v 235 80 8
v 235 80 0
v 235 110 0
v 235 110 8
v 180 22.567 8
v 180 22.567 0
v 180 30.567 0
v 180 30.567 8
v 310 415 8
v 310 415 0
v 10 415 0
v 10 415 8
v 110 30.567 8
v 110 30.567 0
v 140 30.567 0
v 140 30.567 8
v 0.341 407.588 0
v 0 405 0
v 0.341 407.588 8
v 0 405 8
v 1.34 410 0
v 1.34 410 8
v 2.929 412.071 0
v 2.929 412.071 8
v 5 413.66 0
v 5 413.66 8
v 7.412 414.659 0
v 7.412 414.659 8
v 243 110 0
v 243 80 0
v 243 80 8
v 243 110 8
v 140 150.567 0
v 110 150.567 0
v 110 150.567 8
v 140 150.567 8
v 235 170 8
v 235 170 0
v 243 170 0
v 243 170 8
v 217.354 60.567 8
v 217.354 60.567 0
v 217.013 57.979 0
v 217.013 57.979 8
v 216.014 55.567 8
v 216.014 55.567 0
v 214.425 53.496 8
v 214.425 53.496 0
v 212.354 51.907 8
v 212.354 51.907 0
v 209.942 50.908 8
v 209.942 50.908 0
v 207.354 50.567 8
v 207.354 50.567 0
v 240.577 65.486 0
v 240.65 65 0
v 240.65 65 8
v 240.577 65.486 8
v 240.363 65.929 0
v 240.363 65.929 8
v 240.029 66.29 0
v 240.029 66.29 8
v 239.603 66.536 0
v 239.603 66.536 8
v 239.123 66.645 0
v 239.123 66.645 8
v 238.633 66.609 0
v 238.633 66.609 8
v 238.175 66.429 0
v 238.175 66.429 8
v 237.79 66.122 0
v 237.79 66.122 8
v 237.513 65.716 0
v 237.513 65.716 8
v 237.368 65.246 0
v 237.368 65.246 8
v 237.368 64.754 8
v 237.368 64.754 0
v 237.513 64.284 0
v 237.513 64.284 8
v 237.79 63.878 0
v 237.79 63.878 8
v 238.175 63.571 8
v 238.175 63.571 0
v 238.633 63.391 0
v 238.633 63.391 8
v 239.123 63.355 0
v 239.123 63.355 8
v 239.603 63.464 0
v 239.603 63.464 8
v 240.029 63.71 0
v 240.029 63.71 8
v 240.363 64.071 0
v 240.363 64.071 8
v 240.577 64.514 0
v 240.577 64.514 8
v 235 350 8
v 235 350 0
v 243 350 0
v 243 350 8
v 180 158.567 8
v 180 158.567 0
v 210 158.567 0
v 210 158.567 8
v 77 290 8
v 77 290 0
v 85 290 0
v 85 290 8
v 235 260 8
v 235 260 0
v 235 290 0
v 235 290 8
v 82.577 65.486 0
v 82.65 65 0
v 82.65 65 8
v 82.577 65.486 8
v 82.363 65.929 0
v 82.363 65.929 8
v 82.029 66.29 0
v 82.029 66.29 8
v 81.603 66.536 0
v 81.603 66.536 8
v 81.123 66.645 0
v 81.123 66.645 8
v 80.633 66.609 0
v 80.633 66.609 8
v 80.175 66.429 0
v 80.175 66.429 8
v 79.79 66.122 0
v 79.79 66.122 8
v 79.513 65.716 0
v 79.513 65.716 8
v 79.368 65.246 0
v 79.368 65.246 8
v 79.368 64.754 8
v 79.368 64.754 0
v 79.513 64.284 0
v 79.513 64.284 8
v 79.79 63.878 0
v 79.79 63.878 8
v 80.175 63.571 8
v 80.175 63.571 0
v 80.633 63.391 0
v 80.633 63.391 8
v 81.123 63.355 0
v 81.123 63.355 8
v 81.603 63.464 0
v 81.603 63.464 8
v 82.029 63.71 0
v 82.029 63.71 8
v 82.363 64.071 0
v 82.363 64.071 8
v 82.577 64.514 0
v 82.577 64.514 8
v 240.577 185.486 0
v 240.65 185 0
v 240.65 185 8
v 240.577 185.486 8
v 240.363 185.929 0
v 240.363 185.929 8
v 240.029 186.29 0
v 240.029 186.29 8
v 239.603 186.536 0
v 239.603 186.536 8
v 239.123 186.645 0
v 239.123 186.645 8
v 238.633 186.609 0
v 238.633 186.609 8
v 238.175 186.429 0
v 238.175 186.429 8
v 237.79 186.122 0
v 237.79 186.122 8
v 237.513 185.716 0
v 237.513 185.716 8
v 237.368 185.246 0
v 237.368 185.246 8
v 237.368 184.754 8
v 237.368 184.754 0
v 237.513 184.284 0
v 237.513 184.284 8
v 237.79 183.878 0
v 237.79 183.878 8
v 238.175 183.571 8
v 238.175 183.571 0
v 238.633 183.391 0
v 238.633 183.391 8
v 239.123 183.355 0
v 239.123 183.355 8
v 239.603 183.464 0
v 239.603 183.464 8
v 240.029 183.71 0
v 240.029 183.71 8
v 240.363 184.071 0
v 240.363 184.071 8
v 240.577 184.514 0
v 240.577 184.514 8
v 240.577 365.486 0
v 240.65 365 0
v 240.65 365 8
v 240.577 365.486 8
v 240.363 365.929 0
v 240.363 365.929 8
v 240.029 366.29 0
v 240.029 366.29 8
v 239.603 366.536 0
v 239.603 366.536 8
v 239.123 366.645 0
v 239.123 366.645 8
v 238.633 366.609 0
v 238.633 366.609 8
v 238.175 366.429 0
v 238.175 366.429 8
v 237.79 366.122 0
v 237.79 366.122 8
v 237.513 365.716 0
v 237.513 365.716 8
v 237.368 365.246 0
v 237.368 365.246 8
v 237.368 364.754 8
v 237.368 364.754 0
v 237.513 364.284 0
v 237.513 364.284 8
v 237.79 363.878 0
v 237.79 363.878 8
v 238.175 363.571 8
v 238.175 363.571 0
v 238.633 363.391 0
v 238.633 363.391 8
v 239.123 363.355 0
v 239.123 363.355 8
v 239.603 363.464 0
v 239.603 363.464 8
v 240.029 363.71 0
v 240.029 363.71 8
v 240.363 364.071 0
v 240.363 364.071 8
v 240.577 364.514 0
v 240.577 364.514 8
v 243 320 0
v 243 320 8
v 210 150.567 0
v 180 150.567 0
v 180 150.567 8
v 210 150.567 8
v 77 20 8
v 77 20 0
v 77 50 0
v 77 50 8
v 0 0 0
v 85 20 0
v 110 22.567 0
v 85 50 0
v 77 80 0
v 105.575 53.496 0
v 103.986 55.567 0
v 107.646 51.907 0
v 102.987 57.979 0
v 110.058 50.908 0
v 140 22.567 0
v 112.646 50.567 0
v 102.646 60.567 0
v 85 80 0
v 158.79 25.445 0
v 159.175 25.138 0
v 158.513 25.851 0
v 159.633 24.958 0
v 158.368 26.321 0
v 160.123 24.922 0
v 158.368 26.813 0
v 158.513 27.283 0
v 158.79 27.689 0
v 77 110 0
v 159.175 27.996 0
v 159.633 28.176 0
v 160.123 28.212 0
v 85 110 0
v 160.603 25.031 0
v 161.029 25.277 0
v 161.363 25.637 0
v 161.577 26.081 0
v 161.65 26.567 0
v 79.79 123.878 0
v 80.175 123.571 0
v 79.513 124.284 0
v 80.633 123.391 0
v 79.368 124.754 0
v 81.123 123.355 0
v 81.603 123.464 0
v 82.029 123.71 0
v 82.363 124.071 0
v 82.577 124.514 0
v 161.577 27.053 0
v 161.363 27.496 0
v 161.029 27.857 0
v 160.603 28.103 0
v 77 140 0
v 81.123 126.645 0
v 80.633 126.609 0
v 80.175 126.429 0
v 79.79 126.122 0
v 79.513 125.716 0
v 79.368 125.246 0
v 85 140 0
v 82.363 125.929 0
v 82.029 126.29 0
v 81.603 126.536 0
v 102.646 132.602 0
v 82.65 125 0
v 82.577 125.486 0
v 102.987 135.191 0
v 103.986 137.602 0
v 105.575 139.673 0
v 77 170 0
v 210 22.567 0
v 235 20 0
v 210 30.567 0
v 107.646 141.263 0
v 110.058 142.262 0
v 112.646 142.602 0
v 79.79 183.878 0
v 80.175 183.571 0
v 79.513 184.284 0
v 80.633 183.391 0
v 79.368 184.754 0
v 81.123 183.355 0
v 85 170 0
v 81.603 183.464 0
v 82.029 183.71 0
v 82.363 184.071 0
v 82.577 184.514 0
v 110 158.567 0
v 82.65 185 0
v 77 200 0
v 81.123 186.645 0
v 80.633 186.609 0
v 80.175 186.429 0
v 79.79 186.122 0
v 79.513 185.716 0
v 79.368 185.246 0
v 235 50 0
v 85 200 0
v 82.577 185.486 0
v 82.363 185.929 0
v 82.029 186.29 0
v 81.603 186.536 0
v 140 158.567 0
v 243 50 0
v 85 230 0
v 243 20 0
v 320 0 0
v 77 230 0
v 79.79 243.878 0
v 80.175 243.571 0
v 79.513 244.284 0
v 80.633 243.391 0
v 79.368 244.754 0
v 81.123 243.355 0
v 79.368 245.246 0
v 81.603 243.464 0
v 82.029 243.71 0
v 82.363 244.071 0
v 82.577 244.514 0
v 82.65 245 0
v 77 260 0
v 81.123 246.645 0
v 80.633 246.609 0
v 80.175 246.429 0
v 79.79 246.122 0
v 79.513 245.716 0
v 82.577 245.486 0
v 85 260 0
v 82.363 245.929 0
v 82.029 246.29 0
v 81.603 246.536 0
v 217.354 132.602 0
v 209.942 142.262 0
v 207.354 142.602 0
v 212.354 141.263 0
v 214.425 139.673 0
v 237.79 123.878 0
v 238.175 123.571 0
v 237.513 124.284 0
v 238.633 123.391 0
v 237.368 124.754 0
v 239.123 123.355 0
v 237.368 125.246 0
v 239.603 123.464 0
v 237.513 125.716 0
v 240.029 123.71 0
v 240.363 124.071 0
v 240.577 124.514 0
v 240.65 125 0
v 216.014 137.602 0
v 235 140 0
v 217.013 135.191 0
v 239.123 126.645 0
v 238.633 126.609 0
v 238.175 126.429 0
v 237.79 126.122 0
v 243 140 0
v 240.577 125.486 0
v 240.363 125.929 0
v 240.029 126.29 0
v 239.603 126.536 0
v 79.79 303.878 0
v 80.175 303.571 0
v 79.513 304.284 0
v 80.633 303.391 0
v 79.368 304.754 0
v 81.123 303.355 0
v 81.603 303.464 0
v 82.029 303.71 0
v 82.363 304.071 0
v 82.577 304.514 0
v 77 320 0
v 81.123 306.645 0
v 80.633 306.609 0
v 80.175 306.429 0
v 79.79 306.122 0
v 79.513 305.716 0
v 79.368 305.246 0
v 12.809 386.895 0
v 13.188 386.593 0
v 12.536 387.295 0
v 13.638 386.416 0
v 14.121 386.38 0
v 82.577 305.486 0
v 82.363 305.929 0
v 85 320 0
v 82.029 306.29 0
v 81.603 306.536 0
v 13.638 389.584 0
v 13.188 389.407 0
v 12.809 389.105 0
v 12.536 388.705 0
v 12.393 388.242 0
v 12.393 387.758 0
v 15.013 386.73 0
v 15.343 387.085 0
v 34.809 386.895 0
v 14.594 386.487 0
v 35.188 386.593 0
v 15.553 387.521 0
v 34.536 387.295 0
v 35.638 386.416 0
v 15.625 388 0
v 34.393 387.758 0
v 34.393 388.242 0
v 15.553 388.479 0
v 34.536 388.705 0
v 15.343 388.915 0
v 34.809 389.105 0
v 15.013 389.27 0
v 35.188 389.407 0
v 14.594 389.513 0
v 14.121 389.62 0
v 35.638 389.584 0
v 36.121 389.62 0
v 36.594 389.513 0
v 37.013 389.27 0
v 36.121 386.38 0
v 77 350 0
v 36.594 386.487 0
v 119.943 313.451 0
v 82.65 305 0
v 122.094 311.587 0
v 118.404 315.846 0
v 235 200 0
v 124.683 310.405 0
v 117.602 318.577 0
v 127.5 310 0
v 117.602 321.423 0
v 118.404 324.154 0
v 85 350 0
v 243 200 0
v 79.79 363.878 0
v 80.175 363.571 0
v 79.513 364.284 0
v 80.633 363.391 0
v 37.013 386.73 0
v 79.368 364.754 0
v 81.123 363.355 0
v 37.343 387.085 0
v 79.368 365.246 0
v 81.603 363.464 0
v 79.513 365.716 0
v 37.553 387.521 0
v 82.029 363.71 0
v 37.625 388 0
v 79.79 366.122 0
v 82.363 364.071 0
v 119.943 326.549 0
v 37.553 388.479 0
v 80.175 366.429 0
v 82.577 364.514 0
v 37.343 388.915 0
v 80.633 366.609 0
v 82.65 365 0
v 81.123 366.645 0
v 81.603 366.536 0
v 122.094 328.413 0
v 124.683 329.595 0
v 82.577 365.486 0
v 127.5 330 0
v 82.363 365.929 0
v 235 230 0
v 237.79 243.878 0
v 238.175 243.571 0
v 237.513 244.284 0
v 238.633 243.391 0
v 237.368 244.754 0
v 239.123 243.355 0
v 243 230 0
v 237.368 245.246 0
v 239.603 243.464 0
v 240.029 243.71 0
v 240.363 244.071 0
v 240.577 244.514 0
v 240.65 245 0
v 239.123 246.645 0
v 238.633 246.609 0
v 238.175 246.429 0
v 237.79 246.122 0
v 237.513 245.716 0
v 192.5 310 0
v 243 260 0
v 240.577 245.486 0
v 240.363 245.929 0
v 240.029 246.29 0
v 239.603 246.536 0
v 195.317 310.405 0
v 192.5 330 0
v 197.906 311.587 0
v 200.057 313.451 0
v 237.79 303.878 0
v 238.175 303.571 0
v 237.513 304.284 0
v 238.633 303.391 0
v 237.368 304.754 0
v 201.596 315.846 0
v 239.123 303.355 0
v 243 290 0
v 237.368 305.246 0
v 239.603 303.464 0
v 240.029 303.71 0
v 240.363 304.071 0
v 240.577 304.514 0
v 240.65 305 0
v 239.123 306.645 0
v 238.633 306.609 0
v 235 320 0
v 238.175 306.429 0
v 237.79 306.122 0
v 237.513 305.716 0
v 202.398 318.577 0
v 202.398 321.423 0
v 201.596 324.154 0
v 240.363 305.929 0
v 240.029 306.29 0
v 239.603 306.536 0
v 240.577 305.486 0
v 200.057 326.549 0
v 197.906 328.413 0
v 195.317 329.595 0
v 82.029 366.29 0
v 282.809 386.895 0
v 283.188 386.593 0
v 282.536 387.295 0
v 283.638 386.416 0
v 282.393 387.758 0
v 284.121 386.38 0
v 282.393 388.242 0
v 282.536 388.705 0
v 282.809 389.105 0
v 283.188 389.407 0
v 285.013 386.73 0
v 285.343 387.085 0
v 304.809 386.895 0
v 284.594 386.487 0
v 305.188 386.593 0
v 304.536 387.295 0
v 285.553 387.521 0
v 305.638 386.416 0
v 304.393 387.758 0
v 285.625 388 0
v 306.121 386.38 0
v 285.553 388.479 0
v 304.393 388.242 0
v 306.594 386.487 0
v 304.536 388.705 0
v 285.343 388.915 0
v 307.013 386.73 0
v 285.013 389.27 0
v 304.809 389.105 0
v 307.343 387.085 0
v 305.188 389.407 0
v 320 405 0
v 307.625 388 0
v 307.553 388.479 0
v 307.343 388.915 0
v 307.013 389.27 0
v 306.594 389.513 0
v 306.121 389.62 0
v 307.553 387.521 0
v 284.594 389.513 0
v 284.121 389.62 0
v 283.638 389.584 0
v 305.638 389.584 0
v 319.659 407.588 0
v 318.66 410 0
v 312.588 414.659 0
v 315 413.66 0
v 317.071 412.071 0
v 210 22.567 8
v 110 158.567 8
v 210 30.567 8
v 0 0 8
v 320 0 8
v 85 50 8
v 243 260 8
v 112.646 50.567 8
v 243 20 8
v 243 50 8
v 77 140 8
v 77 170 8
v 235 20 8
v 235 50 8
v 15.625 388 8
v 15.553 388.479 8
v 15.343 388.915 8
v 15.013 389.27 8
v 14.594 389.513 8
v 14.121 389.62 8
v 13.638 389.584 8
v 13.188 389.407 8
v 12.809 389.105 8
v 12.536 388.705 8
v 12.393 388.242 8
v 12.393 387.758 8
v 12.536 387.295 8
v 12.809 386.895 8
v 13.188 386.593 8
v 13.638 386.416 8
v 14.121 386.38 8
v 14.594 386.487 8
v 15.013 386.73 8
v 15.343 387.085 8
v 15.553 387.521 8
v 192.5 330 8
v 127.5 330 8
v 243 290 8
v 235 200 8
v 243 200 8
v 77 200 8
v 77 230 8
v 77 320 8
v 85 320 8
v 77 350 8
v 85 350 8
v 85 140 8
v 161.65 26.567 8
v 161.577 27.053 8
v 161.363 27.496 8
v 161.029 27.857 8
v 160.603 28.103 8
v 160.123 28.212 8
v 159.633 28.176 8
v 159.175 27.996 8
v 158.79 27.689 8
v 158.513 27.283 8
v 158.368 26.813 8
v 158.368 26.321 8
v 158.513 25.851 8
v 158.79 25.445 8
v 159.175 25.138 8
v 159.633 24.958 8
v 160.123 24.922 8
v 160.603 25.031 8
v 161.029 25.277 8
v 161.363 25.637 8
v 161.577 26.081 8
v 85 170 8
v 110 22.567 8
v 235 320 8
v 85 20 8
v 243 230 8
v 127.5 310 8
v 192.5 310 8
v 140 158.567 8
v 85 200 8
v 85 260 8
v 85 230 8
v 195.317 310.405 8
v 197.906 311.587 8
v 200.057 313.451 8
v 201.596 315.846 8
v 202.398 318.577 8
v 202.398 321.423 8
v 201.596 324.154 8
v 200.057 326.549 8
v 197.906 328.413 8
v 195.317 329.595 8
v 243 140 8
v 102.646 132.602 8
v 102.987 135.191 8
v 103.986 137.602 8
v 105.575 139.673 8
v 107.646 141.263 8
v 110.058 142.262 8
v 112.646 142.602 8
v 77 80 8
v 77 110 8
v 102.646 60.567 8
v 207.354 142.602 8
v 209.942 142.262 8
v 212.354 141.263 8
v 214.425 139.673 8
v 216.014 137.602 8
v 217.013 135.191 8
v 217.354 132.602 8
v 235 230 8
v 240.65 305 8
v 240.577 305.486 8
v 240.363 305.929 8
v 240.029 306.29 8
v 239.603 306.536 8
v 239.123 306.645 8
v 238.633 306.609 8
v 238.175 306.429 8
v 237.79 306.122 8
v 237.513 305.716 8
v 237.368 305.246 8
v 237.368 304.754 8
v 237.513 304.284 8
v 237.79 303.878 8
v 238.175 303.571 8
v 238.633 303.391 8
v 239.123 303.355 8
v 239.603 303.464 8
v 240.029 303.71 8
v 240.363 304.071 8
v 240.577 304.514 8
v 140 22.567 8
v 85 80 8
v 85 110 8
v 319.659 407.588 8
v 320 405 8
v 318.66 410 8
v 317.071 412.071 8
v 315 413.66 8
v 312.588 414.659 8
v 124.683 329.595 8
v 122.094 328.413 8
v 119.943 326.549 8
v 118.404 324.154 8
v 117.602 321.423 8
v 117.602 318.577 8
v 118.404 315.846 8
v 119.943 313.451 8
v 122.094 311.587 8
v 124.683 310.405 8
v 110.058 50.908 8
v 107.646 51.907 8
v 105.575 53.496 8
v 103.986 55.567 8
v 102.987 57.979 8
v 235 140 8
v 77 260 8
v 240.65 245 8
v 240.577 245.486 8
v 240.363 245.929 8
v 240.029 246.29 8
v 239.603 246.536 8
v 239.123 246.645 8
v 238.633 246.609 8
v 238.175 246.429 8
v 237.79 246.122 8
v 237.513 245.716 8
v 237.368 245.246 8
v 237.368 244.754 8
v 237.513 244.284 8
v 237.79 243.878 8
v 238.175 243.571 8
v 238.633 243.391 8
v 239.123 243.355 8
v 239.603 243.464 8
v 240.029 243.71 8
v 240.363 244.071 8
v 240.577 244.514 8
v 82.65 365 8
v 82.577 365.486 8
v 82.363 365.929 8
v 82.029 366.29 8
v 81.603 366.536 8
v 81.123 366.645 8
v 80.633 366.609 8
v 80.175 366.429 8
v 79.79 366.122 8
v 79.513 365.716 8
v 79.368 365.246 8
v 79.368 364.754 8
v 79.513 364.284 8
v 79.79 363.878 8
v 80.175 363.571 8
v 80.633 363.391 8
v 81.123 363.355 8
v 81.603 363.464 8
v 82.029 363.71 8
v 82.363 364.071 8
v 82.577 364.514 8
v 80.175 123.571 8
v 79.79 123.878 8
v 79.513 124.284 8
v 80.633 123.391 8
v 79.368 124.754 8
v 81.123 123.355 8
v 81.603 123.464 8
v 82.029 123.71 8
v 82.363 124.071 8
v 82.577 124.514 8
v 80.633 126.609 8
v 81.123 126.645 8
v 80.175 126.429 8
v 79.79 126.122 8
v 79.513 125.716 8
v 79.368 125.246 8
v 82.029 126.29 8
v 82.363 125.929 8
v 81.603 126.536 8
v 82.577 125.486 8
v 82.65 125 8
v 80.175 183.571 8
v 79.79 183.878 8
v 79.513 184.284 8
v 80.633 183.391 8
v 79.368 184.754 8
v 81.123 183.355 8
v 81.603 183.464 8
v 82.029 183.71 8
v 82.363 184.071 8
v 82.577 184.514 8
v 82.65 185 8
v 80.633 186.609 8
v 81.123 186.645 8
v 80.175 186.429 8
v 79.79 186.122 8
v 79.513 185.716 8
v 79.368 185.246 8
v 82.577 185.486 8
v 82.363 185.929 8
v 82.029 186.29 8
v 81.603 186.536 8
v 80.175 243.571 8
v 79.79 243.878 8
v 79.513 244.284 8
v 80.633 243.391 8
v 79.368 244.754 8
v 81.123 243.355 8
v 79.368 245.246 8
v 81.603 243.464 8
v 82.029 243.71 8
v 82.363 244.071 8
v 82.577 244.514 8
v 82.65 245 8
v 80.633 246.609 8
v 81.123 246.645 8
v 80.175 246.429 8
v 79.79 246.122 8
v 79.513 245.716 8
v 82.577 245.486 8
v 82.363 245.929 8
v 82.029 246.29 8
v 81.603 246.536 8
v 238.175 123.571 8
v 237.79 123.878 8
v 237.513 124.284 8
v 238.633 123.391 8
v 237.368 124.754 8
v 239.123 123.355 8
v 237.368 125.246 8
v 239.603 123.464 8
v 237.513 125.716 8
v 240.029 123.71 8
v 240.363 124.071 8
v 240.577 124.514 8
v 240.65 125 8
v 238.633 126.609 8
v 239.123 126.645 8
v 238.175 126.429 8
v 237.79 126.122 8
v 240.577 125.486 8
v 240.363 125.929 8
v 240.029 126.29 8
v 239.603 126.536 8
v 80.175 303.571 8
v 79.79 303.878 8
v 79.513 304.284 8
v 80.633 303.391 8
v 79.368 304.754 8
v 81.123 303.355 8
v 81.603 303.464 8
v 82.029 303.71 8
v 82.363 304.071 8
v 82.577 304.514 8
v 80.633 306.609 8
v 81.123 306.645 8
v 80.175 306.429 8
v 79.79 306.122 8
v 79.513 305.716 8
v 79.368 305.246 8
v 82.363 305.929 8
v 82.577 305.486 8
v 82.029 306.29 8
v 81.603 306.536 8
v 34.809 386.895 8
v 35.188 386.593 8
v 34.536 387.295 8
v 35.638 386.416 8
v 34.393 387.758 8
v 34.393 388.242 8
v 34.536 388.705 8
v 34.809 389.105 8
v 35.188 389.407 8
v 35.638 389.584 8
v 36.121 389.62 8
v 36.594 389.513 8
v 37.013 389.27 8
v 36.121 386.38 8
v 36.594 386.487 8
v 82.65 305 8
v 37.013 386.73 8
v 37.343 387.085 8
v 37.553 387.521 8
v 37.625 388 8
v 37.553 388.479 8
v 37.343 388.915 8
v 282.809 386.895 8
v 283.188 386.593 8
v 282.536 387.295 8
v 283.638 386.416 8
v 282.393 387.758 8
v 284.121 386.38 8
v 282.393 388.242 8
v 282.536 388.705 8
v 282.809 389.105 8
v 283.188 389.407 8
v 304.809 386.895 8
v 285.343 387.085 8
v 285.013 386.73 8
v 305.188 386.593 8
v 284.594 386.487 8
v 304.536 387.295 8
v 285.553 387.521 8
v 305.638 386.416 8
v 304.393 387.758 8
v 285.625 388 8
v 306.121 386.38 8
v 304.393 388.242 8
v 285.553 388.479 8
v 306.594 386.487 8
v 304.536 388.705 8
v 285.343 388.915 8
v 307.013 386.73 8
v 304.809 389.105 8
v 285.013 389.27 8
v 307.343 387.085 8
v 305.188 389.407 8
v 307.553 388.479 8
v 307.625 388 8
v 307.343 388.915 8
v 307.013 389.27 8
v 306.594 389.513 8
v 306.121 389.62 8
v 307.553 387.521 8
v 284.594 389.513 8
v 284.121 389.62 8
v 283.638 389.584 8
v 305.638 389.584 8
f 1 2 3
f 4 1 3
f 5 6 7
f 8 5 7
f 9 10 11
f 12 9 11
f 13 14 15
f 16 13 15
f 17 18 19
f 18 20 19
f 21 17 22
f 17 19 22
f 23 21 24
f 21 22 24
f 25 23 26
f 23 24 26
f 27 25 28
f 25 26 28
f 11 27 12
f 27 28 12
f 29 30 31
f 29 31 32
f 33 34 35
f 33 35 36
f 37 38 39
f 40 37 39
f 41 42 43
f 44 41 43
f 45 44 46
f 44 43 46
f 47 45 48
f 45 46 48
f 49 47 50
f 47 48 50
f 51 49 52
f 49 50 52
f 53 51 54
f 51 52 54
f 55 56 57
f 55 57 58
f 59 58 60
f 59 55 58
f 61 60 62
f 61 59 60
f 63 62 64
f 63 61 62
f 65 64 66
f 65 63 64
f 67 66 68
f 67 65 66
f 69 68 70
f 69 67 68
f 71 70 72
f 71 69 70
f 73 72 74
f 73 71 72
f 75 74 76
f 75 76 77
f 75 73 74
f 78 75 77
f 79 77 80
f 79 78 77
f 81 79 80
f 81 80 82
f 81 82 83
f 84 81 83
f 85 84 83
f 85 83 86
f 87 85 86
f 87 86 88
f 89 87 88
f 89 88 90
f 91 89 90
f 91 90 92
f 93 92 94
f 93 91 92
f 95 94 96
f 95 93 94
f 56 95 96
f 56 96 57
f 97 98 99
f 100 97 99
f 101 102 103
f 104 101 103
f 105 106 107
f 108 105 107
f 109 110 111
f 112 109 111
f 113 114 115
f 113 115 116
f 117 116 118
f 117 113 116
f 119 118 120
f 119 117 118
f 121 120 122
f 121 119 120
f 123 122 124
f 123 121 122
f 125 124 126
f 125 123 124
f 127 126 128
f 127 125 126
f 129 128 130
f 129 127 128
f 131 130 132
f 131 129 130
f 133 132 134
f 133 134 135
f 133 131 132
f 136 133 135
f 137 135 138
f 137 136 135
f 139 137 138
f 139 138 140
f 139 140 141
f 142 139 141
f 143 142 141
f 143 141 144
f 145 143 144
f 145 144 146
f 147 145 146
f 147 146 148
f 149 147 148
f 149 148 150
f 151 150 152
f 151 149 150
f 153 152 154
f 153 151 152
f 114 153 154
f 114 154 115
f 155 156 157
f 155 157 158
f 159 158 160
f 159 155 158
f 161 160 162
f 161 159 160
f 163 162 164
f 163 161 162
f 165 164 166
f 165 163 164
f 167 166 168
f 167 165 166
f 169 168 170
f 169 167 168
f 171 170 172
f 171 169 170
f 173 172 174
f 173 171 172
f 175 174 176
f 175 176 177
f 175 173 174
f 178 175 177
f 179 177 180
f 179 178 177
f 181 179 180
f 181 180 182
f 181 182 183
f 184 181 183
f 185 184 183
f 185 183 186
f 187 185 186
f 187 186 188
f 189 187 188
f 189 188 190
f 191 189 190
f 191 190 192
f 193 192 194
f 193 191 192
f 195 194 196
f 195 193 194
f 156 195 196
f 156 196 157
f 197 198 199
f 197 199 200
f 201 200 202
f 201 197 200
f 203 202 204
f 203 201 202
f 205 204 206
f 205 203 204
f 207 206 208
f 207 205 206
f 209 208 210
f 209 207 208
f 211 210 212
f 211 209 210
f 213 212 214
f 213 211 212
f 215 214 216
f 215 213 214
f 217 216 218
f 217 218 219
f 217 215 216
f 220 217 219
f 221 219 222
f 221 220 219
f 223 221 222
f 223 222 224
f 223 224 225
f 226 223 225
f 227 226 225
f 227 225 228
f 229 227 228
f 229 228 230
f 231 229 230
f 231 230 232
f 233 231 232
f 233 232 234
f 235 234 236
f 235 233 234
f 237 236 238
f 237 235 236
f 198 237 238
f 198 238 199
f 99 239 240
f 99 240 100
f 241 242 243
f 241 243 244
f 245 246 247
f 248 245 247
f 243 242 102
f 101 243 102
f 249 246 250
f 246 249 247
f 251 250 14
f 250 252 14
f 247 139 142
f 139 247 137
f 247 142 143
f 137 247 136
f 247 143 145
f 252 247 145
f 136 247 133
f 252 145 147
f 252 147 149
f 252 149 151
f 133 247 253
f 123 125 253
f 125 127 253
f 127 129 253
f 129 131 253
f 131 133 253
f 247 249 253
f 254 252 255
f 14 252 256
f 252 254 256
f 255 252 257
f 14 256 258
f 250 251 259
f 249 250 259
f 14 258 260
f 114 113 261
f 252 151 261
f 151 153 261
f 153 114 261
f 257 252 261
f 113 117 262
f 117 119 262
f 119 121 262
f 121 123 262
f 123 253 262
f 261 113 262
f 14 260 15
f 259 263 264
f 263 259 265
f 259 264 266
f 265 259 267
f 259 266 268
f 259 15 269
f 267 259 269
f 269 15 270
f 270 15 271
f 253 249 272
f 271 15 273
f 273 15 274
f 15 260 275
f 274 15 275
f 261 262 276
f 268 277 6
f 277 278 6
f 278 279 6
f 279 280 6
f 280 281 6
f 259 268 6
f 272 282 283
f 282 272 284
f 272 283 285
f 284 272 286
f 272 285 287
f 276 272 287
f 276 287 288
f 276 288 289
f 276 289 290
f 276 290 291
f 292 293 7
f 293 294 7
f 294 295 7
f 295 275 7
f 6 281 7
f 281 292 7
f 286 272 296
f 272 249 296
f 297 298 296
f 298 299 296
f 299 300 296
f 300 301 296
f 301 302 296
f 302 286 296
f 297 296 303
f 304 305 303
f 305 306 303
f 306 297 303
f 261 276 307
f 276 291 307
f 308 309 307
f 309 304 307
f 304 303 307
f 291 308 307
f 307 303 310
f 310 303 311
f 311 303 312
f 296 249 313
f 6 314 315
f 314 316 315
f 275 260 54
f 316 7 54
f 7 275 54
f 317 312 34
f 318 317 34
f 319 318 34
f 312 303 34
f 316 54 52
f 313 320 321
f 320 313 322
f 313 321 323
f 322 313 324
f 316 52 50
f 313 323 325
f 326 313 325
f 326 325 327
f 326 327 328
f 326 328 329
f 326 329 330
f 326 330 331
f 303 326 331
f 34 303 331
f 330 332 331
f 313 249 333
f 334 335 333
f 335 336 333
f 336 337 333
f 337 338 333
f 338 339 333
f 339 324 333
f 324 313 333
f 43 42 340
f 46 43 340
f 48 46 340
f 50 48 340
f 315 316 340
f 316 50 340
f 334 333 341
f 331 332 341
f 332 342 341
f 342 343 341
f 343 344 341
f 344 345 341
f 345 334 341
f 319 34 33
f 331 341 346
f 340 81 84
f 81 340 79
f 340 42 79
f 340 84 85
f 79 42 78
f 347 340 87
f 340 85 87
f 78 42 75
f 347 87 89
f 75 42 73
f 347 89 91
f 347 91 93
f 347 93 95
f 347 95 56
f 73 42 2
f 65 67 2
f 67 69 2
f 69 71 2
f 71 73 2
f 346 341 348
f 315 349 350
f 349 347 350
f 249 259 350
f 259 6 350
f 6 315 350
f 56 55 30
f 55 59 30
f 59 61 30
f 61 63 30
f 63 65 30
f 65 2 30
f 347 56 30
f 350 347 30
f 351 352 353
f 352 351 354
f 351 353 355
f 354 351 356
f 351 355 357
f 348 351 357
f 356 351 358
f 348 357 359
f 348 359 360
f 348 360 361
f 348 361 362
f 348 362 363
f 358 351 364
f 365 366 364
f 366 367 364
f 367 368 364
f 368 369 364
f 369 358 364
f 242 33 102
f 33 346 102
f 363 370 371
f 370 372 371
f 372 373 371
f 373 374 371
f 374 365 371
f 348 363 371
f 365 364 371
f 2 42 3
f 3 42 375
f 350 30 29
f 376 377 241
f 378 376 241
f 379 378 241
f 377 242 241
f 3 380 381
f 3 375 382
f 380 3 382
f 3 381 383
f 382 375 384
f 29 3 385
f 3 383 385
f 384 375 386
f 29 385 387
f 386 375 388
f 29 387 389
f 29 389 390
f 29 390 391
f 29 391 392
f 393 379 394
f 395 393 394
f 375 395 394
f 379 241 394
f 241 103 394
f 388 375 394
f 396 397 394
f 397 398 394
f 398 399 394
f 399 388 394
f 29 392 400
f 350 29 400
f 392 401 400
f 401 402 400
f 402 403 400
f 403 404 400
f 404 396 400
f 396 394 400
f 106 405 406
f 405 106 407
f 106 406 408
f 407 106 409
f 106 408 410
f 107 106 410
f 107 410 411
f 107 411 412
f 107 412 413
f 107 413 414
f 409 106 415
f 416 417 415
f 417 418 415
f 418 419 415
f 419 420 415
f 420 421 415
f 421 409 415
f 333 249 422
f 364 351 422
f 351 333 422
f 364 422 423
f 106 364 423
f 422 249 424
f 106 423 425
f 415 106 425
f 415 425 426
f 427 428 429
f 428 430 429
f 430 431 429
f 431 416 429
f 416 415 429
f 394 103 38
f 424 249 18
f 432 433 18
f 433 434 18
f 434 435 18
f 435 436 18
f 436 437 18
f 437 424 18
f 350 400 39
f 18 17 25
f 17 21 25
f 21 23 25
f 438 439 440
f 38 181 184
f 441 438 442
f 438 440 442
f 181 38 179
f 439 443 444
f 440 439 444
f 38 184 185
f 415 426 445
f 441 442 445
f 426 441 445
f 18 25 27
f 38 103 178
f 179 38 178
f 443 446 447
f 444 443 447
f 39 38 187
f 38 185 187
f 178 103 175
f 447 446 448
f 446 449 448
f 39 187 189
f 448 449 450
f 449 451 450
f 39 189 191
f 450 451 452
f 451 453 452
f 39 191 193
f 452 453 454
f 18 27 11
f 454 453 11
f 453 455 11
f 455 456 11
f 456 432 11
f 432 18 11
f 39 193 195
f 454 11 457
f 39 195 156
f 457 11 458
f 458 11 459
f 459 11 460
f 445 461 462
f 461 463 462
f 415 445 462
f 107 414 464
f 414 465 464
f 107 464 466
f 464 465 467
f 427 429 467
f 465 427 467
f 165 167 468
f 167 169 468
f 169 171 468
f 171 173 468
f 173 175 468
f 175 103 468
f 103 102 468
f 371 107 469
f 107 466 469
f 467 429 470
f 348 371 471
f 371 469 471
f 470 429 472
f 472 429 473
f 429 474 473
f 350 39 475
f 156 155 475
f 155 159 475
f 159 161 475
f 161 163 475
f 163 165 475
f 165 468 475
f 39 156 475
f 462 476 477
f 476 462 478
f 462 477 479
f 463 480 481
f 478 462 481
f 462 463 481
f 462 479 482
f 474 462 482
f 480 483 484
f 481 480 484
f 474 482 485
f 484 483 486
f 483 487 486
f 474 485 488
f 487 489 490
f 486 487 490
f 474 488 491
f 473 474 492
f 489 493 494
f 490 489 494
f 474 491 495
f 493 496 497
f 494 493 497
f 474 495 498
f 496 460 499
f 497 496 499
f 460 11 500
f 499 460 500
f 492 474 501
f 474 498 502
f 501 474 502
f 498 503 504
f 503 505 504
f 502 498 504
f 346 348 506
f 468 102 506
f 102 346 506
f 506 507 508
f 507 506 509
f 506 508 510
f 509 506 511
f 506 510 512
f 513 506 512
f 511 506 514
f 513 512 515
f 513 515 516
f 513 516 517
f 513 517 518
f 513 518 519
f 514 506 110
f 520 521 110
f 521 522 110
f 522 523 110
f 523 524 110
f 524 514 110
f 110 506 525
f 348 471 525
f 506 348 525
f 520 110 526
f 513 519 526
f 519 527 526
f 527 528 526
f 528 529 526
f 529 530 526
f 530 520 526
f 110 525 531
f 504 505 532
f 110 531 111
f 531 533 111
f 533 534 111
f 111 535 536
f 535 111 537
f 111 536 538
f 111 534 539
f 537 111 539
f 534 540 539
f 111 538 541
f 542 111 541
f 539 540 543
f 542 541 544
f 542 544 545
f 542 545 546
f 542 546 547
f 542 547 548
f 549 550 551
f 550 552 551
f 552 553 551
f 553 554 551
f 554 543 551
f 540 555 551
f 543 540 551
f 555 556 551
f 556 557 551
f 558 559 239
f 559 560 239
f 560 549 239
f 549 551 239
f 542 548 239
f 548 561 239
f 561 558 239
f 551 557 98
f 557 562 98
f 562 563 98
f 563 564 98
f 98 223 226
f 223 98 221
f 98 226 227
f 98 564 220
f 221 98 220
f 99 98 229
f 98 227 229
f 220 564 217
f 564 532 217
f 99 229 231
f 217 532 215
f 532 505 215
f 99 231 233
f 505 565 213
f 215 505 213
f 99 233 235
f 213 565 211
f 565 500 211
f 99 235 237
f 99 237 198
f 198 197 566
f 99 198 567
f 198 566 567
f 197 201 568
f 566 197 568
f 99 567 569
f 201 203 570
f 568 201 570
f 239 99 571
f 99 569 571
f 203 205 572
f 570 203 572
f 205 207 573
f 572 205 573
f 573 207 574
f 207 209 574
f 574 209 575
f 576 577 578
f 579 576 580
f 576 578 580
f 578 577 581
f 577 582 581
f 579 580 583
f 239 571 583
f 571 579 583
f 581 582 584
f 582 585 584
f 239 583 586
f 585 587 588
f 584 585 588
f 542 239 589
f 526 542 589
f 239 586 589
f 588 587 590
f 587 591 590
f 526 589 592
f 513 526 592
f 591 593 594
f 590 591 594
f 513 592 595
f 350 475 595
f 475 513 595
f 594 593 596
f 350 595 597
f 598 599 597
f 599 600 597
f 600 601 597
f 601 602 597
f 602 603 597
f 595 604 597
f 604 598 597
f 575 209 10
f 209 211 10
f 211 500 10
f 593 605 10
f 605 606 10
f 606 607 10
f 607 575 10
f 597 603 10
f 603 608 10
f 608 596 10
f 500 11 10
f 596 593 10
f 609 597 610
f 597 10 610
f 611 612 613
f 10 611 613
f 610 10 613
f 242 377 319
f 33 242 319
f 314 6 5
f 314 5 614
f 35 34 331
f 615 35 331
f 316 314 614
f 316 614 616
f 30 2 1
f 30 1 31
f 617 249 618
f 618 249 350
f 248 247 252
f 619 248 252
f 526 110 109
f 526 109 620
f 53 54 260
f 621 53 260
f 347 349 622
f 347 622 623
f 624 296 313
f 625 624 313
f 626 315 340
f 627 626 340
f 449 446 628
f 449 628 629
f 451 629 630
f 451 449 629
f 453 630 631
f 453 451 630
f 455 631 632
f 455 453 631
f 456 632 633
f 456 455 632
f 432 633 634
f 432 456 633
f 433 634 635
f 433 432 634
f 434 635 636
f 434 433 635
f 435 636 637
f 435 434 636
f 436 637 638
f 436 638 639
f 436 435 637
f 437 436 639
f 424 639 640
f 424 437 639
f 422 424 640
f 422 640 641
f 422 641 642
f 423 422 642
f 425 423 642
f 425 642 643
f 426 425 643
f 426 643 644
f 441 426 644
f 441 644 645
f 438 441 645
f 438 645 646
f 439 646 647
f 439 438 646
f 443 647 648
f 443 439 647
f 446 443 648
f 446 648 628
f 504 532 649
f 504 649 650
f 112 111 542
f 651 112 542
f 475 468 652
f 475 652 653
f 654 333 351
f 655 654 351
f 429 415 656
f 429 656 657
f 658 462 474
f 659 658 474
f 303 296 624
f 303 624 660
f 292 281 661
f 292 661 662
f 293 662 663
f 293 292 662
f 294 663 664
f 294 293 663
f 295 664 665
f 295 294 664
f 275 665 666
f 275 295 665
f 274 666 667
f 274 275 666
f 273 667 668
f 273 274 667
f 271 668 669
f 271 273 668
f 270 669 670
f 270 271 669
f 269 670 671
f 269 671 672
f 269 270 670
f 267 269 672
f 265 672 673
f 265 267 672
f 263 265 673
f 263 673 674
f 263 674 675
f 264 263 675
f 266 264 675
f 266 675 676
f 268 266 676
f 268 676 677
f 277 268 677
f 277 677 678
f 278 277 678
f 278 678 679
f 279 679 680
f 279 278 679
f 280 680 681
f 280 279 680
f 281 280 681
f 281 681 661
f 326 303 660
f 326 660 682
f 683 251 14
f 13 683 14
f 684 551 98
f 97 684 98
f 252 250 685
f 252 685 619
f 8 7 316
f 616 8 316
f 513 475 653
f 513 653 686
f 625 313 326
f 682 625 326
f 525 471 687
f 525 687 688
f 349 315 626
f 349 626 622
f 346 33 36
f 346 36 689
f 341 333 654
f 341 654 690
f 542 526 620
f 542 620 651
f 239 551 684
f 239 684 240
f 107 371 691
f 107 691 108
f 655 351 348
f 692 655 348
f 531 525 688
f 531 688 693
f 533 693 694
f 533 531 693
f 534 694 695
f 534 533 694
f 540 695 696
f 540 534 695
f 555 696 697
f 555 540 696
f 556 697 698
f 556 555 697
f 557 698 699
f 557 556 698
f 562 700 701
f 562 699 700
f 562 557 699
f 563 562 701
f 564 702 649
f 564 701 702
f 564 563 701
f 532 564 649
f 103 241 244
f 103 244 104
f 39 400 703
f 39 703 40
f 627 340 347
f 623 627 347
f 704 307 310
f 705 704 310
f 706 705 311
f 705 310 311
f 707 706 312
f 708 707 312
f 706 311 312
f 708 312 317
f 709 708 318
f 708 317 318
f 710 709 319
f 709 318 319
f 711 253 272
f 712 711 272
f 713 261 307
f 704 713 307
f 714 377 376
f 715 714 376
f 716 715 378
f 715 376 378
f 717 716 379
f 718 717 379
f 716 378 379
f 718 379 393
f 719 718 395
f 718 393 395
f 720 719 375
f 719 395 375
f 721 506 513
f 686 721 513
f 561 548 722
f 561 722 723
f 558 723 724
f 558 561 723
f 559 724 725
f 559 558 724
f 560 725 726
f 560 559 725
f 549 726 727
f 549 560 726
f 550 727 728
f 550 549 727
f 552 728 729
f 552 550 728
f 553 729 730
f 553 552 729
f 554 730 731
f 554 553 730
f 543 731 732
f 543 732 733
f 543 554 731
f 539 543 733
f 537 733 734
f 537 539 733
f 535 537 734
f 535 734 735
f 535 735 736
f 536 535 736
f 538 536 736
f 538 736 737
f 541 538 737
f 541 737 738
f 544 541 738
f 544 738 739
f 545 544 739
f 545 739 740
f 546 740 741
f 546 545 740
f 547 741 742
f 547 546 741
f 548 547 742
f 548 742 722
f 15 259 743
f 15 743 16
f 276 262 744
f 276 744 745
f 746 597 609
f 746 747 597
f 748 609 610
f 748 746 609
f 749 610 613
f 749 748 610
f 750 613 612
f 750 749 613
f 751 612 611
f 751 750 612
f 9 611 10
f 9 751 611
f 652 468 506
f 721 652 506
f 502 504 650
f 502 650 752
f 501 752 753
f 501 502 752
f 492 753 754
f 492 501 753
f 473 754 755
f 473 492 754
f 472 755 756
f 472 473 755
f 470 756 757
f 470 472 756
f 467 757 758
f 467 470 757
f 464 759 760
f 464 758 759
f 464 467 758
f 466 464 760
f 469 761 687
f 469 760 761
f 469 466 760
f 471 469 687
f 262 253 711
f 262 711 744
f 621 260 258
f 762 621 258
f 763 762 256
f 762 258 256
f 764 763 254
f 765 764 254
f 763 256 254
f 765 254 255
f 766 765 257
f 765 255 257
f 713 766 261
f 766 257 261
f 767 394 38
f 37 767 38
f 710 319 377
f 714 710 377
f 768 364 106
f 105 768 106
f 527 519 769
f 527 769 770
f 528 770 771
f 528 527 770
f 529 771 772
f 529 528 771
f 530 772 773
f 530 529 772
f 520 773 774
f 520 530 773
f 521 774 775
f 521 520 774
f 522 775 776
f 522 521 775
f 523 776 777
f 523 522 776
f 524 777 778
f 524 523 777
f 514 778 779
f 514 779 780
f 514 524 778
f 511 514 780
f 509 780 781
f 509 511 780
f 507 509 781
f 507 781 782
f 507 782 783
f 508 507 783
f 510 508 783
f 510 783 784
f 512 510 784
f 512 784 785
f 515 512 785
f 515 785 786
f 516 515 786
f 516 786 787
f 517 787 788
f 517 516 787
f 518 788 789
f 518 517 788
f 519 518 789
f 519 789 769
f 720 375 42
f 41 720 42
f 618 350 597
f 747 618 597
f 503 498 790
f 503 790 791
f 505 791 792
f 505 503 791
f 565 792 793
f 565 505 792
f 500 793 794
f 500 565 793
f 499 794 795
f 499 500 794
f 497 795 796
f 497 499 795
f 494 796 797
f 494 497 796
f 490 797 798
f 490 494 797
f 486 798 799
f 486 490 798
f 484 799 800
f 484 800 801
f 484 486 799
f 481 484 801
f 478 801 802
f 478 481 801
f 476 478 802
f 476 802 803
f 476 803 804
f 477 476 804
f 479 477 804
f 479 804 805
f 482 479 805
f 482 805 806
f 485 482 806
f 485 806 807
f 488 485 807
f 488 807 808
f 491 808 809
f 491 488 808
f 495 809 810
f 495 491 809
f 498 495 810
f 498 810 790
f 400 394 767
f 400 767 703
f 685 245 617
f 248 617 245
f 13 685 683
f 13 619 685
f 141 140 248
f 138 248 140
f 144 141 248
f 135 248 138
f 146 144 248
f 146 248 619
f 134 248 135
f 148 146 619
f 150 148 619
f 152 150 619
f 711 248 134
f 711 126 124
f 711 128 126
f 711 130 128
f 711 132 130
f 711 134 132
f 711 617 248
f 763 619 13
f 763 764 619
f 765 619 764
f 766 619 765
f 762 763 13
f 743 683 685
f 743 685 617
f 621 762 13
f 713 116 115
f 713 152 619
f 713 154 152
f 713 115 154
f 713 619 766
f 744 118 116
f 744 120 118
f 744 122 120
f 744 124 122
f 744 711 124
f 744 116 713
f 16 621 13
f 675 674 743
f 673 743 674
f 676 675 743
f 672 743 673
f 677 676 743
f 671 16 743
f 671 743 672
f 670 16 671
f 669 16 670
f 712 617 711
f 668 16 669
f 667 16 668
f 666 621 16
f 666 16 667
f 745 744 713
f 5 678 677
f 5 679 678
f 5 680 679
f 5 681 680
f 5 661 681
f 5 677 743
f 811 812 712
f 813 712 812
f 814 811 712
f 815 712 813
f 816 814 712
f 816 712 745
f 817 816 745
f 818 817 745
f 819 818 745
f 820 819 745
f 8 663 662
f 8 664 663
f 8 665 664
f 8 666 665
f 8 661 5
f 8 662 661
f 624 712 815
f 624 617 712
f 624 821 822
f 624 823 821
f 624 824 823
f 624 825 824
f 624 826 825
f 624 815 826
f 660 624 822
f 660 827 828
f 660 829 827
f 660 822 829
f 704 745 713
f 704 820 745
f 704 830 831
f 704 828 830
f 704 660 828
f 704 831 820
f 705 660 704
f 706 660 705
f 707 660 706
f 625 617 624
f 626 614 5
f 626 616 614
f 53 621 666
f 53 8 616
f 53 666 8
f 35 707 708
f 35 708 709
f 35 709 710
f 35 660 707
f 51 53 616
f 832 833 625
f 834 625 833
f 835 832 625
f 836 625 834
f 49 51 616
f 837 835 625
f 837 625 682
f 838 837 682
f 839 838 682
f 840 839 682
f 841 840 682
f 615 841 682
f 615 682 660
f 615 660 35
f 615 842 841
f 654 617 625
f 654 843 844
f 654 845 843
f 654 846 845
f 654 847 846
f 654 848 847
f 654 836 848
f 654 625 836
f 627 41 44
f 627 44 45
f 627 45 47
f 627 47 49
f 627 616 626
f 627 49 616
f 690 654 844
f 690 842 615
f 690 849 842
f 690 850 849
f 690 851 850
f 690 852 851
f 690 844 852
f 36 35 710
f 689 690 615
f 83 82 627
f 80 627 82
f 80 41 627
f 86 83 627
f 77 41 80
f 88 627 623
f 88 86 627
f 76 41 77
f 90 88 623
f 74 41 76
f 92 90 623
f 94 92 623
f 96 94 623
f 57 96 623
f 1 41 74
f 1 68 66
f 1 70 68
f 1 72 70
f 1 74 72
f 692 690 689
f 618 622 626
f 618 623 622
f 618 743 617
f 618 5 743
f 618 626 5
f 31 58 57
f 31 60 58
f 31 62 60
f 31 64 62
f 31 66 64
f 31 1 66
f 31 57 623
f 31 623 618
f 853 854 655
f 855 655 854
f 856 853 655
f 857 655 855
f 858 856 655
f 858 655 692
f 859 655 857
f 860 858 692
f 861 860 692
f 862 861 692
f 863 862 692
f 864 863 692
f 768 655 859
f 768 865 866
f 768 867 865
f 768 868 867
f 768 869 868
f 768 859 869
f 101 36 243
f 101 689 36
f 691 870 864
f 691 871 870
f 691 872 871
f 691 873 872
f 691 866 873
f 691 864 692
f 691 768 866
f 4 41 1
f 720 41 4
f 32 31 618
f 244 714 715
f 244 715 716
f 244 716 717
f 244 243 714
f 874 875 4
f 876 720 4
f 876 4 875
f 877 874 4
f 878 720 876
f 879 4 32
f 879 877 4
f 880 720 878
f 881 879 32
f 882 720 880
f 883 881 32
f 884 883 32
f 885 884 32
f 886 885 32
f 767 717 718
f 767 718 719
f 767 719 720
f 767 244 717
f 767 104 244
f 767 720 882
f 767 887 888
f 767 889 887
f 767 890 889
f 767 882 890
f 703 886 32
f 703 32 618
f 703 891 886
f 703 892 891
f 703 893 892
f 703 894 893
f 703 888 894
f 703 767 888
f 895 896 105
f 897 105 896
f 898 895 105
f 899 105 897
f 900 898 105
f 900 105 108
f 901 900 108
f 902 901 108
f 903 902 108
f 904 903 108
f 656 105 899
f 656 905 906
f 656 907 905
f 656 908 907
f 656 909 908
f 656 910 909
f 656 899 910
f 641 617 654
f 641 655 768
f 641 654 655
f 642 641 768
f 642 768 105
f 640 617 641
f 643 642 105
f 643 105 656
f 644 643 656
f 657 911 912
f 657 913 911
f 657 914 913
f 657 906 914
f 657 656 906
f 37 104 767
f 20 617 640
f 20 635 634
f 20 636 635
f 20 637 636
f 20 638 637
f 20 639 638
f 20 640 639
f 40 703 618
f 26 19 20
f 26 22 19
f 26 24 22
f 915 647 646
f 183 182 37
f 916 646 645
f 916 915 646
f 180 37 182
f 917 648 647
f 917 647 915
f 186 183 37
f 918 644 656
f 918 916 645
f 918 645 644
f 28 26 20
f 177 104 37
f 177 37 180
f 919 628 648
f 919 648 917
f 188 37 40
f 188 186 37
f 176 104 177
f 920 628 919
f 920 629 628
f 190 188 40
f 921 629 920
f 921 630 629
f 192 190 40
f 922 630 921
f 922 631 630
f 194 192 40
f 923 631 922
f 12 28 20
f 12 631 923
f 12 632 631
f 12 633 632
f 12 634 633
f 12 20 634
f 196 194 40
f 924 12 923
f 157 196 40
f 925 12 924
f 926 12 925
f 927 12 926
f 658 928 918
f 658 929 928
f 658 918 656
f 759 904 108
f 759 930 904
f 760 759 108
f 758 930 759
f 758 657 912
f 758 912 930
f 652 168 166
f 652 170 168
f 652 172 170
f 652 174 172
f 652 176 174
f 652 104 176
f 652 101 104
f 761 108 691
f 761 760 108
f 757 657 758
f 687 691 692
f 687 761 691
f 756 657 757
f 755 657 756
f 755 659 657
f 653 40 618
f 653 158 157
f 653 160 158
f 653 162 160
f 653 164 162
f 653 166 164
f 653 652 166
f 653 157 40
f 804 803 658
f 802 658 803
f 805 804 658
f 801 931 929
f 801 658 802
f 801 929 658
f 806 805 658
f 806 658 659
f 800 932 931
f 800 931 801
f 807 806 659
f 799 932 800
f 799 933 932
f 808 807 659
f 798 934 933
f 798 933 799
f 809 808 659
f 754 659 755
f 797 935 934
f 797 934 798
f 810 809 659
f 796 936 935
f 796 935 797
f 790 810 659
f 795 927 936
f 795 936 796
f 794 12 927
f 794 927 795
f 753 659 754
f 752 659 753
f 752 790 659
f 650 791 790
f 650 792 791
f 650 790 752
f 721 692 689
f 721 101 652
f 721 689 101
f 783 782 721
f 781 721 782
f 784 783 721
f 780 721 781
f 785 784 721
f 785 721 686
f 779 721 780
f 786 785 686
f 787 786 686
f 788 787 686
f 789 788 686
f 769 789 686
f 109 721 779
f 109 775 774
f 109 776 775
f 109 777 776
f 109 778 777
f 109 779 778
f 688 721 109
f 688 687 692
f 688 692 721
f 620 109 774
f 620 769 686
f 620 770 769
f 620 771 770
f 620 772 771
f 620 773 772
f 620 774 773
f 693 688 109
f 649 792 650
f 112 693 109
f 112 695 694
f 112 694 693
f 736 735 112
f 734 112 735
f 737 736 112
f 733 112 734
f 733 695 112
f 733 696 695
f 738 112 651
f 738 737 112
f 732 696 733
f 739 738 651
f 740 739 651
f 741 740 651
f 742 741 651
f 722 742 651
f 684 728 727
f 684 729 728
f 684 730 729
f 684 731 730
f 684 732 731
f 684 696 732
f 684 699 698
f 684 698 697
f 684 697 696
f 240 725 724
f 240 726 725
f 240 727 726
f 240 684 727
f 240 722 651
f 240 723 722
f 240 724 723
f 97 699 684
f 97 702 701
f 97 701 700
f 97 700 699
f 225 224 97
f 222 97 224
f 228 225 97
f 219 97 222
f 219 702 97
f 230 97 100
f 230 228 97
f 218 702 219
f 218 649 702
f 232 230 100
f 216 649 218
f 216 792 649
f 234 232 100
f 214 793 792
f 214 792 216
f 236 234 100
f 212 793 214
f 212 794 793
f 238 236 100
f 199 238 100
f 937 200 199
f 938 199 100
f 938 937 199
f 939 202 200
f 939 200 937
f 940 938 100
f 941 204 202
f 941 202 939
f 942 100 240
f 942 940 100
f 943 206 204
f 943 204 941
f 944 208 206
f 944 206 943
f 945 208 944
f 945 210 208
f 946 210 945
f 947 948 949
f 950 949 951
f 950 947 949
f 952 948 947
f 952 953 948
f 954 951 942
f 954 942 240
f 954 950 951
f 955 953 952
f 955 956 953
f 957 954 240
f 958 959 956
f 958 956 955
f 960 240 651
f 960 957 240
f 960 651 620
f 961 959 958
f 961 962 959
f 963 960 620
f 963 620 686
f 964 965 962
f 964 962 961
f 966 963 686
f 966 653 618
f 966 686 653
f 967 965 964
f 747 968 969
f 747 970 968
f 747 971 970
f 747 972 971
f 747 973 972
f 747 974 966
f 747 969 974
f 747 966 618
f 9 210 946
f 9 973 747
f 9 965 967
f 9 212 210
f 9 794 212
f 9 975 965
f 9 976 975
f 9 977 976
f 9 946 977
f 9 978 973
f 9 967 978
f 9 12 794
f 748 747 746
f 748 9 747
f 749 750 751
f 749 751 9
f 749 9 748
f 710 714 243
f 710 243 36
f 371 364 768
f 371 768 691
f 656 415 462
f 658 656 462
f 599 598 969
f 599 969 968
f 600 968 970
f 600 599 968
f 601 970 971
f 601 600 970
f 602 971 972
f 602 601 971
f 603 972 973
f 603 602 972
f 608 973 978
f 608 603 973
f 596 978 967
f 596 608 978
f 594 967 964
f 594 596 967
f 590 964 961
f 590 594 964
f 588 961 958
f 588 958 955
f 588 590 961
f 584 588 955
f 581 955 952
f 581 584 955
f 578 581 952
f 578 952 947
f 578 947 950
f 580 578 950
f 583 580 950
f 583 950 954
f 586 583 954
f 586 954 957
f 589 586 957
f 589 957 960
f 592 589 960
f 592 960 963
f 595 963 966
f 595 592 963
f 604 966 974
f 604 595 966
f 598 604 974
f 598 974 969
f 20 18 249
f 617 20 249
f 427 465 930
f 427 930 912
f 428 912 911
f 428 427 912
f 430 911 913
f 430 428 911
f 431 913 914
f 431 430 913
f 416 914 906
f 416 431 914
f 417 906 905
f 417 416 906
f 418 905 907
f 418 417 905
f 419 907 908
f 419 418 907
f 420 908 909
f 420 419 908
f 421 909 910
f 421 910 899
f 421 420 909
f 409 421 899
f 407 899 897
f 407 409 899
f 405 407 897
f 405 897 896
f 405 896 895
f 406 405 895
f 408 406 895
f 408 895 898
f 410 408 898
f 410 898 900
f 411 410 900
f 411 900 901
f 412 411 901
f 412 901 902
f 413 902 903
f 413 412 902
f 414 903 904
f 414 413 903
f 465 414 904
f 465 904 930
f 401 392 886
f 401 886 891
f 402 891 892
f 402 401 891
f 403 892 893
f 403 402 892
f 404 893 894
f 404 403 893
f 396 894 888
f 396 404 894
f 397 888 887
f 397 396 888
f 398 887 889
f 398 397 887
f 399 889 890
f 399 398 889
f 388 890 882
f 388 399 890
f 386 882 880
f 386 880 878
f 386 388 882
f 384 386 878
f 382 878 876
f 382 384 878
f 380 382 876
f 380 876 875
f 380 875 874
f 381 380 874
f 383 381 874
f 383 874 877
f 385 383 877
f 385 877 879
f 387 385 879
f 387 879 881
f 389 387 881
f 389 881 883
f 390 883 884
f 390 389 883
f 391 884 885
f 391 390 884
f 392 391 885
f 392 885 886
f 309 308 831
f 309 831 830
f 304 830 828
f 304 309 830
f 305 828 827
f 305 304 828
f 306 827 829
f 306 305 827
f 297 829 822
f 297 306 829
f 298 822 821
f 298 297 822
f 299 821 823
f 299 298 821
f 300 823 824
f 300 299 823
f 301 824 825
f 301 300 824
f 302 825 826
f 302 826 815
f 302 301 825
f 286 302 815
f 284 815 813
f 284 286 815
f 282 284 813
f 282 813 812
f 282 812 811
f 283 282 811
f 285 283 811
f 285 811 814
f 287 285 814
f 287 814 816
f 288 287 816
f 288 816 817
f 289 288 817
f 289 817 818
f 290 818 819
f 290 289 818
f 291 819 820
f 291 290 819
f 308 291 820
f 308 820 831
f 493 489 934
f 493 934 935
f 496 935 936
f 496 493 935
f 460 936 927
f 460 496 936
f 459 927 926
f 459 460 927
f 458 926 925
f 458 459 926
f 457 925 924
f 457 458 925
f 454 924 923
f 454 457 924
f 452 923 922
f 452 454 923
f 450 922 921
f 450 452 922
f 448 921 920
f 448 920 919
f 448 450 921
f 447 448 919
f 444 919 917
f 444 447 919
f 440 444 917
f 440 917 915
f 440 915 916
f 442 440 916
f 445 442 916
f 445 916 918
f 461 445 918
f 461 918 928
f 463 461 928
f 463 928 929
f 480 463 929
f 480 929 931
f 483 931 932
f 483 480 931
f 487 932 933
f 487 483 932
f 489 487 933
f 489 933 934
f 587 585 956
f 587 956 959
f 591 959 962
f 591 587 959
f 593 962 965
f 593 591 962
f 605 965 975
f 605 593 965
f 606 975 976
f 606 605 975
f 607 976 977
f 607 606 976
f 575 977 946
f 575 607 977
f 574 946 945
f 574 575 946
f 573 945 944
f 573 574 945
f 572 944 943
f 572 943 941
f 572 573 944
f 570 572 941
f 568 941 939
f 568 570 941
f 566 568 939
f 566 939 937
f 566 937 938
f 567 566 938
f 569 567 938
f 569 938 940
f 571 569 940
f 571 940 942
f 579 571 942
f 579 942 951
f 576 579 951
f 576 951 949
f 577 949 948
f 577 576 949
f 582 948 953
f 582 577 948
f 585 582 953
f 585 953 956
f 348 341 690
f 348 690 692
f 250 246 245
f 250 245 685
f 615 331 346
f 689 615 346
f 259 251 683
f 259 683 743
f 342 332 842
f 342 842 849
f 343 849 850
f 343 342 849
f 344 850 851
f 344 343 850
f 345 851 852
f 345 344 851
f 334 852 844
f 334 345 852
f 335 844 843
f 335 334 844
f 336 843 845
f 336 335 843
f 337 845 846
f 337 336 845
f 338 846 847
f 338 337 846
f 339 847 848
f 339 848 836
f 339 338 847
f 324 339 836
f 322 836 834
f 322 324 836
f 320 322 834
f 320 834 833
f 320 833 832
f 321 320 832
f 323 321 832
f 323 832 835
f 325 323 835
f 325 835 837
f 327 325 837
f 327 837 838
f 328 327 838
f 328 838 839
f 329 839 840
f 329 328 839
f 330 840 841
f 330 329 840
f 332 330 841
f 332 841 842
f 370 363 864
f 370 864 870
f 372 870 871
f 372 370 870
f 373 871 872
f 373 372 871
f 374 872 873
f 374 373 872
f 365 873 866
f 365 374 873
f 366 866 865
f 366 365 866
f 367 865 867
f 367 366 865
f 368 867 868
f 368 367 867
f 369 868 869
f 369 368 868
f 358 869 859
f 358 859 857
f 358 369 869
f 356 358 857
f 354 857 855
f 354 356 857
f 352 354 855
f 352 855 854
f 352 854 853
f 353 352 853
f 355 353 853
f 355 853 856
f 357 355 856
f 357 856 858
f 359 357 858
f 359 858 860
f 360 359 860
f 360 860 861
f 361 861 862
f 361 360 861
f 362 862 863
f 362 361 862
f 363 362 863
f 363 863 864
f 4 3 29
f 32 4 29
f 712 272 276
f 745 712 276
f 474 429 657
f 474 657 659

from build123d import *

# Parameters (mm, degrees)
SKETCH1_R           = 1.625
SKETCH1_R_2         = 1.65
SKETCH1_W           = 8
SKETCH1_H           = 30
SKETCH1_W_2         = 30
SKETCH1_H_2         = 8
BOSS_EXTRUDE1_DEPTH = 8
FILLET1_R           = 10
CUT_EXTRUDE1_DEPTH  = 9


with BuildPart() as part:
    # Sketch1 → Boss-Extrude1 (new body)
    with BuildSketch(Plane.XY):
        Polygon((0, 0), (320, 0), (320, 415), (160, 415), (0, 415), align=None)
        with Locations((14, 388)):
            Circle(SKETCH1_R, mode=Mode.SUBTRACT)
        with Locations((36, 388)):
            Circle(SKETCH1_R, mode=Mode.SUBTRACT)
        with Locations((284, 388)):
            Circle(SKETCH1_R, mode=Mode.SUBTRACT)
        with Locations((306, 388)):
            Circle(SKETCH1_R, mode=Mode.SUBTRACT)
        with Locations((81, 65)):
            Circle(SKETCH1_R_2, mode=Mode.SUBTRACT)
        with Locations((239, 65)):
            Circle(SKETCH1_R_2, mode=Mode.SUBTRACT)
        with Locations((81, 125)):
            Circle(SKETCH1_R_2, mode=Mode.SUBTRACT)
        with Locations((239, 125)):
            Circle(SKETCH1_R_2, mode=Mode.SUBTRACT)
        with Locations((81, 185)):
            Circle(SKETCH1_R_2, mode=Mode.SUBTRACT)
        with Locations((239, 185)):
            Circle(SKETCH1_R_2, mode=Mode.SUBTRACT)
        with Locations((81, 245)):
            Circle(SKETCH1_R_2, mode=Mode.SUBTRACT)
        with Locations((239, 245)):
            Circle(SKETCH1_R_2, mode=Mode.SUBTRACT)
        with Locations((81, 305)):
            Circle(SKETCH1_R_2, mode=Mode.SUBTRACT)
        with Locations((239, 305)):
            Circle(SKETCH1_R_2, mode=Mode.SUBTRACT)
        with Locations((81, 365)):
            Circle(SKETCH1_R_2, mode=Mode.SUBTRACT)
        with Locations((239, 365)):
            Circle(SKETCH1_R_2, mode=Mode.SUBTRACT)
        with Locations((160, 26.566938385)):
            Circle(SKETCH1_R_2, mode=Mode.SUBTRACT)
        with BuildLine():
            Line((112.646025267, 142.602367126), (207.353974733, 142.602367126))
            ThreePointArc((207.353974733, 142.602367126), (214.425042545, 139.673434938), (217.353974733, 132.602367126))
            Line((217.353974733, 132.602367126), (217.353974733, 60.566938385))
            ThreePointArc((217.353974733, 60.566938385), (214.425042545, 53.495870573), (207.353974733, 50.566938385))
            Line((207.353974733, 50.566938385), (112.646025267, 50.566938385))
            ThreePointArc((112.646025267, 50.566938385), (105.574957455, 53.495870573), (102.646025267, 60.566938385))
            Line((102.646025267, 60.566938385), (102.646025267, 132.602367126))
            ThreePointArc((102.646025267, 132.602367126), (105.574957455, 139.673434938), (112.646025267, 142.602367126))
        make_face(mode=Mode.SUBTRACT)
        with Locations((81, 35)):
            Rectangle(SKETCH1_W, SKETCH1_H, mode=Mode.SUBTRACT)
        with Locations((195, 26.566938385)):
            Rectangle(SKETCH1_W_2, SKETCH1_H_2, mode=Mode.SUBTRACT)
        with Locations((125, 26.566938385)):
            Rectangle(SKETCH1_W_2, SKETCH1_H_2, mode=Mode.SUBTRACT)
        with Locations((125, 154.566938385)):
            Rectangle(SKETCH1_W_2, SKETCH1_H_2, mode=Mode.SUBTRACT)
        with Locations((195, 154.566938385)):
            Rectangle(SKETCH1_W_2, SKETCH1_H_2, mode=Mode.SUBTRACT)
        with Locations((239, 35)):
            Rectangle(SKETCH1_W, SKETCH1_H, mode=Mode.SUBTRACT)
        with Locations((81, 95)):
            Rectangle(SKETCH1_W, SKETCH1_H, mode=Mode.SUBTRACT)
        with Locations((239, 95)):
            Rectangle(SKETCH1_W, SKETCH1_H, mode=Mode.SUBTRACT)
        with Locations((81, 155)):
            Rectangle(SKETCH1_W, SKETCH1_H, mode=Mode.SUBTRACT)
        with Locations((239, 155)):
            Rectangle(SKETCH1_W, SKETCH1_H, mode=Mode.SUBTRACT)
        with Locations((81, 215)):
            Rectangle(SKETCH1_W, SKETCH1_H, mode=Mode.SUBTRACT)
        with Locations((239, 215)):
            Rectangle(SKETCH1_W, SKETCH1_H, mode=Mode.SUBTRACT)
        with Locations((81, 275)):
            Rectangle(SKETCH1_W, SKETCH1_H, mode=Mode.SUBTRACT)
        with Locations((239, 275)):
            Rectangle(SKETCH1_W, SKETCH1_H, mode=Mode.SUBTRACT)
        with Locations((81, 335)):
            Rectangle(SKETCH1_W, SKETCH1_H, mode=Mode.SUBTRACT)
        with Locations((239, 335)):
            Rectangle(SKETCH1_W, SKETCH1_H, mode=Mode.SUBTRACT)
    extrude(amount=BOSS_EXTRUDE1_DEPTH)

    # Fillet1
    fillet1_edges = [part.edges().sort_by_distance(p)[0] for p in [
        (0, 415, 4),
        (320, 415, 4),
    ]]
    fillet(fillet1_edges, radius=FILLET1_R)

    # Sketch2 → Cut-Extrude1 (cut, through all)
    with BuildSketch(Plane(origin=(0, 0, 0), x_dir=(-1, 0, 0), z_dir=(0, 0, -1))):
        with BuildLine():
            Line((-192.5, 330), (-127.5, 330))
            ThreePointArc((-127.5, 330), (-117.5, 320), (-127.5, 310))
            Line((-127.5, 310), (-192.5, 310))
            ThreePointArc((-192.5, 310), (-202.5, 320), (-192.5, 330))
        make_face()
    extrude(amount=-CUT_EXTRUDE1_DEPTH, mode=Mode.SUBTRACT)


solid = part.part
